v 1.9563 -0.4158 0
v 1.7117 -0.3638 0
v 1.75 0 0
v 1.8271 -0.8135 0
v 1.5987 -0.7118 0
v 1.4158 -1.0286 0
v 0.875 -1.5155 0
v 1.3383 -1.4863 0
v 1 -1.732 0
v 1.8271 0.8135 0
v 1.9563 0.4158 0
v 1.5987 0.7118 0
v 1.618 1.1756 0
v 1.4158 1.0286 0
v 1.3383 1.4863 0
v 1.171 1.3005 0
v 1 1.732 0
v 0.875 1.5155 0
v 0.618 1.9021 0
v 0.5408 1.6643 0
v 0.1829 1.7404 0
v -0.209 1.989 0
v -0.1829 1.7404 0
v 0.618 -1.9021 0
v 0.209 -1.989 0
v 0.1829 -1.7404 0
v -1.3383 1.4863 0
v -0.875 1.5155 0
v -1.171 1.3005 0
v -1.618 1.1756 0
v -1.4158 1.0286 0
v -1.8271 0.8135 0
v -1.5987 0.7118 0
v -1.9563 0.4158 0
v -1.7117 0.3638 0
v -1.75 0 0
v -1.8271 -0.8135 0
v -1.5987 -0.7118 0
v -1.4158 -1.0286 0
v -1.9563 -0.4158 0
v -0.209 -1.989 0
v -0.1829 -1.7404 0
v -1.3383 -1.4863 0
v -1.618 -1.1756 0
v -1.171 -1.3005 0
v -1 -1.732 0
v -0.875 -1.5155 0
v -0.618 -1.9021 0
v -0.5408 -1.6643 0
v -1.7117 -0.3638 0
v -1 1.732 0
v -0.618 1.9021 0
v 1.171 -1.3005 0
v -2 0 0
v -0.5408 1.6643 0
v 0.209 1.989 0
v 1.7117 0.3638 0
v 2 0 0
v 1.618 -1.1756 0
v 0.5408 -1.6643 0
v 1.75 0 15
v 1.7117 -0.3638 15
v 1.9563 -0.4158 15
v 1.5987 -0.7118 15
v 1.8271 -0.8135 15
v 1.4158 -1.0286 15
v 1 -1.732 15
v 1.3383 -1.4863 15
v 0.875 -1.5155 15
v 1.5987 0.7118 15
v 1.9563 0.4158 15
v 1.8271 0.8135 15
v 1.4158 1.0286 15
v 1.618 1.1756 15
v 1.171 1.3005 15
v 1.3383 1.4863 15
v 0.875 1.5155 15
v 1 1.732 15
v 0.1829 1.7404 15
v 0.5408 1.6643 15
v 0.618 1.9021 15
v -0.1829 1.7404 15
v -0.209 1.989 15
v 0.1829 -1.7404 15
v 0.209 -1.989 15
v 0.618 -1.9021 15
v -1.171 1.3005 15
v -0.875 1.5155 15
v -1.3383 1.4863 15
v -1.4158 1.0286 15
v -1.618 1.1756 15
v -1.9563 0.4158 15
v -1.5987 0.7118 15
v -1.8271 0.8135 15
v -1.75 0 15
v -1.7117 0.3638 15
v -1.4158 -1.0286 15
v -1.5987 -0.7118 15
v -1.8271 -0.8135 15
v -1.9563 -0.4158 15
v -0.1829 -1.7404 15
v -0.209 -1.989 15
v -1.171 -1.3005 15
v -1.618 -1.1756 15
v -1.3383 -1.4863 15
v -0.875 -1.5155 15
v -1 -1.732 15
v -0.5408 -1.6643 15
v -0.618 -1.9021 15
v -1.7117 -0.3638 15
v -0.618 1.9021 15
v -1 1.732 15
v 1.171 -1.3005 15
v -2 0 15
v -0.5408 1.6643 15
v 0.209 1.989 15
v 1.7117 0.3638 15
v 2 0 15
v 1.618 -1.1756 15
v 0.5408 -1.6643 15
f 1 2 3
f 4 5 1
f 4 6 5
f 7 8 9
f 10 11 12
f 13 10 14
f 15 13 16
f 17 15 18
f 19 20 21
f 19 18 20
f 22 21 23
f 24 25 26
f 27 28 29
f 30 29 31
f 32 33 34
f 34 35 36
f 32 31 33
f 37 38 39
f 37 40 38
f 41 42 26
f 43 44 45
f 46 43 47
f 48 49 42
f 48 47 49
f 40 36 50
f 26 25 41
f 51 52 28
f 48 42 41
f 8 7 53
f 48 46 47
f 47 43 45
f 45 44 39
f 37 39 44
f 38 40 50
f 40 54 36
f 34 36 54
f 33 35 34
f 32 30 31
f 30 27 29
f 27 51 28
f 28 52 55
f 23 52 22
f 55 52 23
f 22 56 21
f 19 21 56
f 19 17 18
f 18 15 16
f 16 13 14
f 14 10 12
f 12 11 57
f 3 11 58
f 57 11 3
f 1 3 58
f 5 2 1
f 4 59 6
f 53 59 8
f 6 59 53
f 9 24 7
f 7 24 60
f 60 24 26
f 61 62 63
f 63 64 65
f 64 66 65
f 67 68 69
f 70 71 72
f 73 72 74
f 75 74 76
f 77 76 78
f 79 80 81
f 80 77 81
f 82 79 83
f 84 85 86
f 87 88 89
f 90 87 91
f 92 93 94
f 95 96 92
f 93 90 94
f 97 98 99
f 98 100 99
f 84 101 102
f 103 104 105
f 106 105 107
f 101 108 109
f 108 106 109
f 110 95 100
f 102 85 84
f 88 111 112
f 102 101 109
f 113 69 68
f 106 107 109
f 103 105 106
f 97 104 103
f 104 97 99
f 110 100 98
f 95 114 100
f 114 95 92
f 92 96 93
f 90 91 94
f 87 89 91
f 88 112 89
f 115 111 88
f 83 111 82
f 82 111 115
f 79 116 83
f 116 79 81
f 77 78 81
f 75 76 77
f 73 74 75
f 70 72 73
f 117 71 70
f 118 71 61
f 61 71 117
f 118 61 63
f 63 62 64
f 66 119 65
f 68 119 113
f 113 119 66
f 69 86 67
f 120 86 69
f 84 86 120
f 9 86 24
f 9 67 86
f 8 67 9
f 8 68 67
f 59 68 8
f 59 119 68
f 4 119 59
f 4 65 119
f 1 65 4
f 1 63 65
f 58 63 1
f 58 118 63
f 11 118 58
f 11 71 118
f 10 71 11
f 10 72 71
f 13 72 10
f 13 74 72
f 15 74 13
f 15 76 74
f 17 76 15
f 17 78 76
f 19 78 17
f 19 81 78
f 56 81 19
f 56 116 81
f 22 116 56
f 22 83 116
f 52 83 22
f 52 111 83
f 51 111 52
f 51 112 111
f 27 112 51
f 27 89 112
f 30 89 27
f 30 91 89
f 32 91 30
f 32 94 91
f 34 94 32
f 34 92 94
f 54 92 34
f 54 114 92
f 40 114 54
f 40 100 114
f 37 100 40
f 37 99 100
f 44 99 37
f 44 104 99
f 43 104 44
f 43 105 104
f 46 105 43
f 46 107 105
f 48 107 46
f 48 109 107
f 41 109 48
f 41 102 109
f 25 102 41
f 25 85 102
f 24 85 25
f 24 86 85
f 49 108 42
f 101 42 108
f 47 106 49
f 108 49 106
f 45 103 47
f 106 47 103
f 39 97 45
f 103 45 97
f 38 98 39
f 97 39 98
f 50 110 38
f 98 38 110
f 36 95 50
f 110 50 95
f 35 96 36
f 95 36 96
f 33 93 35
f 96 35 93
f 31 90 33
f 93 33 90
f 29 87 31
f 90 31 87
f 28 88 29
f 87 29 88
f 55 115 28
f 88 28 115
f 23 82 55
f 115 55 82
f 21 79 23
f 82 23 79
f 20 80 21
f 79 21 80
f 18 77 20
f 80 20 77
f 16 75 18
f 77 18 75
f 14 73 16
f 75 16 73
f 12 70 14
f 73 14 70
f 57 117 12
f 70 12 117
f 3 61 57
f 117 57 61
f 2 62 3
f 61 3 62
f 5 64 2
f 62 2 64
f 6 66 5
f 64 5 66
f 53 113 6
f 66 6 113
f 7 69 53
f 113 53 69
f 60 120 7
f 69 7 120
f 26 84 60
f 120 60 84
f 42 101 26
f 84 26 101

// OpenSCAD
// Nicolì Angelo 2023 - THIS CODE IS LICENSED AS GPL-2.0

Pipe_Lenght = 15;
Pipe_Dext = 4;
Pipe_Dint = 3.5;

color("#a8b0b2")
linear_extrude(Pipe_Lenght, $fn = $preview? 90: 30) 

difference(){
circle(d = Pipe_Dext, $fn = $preview? 90: 30);
circle(d = Pipe_Dint, $fn = $preview? 90: 30);
}
